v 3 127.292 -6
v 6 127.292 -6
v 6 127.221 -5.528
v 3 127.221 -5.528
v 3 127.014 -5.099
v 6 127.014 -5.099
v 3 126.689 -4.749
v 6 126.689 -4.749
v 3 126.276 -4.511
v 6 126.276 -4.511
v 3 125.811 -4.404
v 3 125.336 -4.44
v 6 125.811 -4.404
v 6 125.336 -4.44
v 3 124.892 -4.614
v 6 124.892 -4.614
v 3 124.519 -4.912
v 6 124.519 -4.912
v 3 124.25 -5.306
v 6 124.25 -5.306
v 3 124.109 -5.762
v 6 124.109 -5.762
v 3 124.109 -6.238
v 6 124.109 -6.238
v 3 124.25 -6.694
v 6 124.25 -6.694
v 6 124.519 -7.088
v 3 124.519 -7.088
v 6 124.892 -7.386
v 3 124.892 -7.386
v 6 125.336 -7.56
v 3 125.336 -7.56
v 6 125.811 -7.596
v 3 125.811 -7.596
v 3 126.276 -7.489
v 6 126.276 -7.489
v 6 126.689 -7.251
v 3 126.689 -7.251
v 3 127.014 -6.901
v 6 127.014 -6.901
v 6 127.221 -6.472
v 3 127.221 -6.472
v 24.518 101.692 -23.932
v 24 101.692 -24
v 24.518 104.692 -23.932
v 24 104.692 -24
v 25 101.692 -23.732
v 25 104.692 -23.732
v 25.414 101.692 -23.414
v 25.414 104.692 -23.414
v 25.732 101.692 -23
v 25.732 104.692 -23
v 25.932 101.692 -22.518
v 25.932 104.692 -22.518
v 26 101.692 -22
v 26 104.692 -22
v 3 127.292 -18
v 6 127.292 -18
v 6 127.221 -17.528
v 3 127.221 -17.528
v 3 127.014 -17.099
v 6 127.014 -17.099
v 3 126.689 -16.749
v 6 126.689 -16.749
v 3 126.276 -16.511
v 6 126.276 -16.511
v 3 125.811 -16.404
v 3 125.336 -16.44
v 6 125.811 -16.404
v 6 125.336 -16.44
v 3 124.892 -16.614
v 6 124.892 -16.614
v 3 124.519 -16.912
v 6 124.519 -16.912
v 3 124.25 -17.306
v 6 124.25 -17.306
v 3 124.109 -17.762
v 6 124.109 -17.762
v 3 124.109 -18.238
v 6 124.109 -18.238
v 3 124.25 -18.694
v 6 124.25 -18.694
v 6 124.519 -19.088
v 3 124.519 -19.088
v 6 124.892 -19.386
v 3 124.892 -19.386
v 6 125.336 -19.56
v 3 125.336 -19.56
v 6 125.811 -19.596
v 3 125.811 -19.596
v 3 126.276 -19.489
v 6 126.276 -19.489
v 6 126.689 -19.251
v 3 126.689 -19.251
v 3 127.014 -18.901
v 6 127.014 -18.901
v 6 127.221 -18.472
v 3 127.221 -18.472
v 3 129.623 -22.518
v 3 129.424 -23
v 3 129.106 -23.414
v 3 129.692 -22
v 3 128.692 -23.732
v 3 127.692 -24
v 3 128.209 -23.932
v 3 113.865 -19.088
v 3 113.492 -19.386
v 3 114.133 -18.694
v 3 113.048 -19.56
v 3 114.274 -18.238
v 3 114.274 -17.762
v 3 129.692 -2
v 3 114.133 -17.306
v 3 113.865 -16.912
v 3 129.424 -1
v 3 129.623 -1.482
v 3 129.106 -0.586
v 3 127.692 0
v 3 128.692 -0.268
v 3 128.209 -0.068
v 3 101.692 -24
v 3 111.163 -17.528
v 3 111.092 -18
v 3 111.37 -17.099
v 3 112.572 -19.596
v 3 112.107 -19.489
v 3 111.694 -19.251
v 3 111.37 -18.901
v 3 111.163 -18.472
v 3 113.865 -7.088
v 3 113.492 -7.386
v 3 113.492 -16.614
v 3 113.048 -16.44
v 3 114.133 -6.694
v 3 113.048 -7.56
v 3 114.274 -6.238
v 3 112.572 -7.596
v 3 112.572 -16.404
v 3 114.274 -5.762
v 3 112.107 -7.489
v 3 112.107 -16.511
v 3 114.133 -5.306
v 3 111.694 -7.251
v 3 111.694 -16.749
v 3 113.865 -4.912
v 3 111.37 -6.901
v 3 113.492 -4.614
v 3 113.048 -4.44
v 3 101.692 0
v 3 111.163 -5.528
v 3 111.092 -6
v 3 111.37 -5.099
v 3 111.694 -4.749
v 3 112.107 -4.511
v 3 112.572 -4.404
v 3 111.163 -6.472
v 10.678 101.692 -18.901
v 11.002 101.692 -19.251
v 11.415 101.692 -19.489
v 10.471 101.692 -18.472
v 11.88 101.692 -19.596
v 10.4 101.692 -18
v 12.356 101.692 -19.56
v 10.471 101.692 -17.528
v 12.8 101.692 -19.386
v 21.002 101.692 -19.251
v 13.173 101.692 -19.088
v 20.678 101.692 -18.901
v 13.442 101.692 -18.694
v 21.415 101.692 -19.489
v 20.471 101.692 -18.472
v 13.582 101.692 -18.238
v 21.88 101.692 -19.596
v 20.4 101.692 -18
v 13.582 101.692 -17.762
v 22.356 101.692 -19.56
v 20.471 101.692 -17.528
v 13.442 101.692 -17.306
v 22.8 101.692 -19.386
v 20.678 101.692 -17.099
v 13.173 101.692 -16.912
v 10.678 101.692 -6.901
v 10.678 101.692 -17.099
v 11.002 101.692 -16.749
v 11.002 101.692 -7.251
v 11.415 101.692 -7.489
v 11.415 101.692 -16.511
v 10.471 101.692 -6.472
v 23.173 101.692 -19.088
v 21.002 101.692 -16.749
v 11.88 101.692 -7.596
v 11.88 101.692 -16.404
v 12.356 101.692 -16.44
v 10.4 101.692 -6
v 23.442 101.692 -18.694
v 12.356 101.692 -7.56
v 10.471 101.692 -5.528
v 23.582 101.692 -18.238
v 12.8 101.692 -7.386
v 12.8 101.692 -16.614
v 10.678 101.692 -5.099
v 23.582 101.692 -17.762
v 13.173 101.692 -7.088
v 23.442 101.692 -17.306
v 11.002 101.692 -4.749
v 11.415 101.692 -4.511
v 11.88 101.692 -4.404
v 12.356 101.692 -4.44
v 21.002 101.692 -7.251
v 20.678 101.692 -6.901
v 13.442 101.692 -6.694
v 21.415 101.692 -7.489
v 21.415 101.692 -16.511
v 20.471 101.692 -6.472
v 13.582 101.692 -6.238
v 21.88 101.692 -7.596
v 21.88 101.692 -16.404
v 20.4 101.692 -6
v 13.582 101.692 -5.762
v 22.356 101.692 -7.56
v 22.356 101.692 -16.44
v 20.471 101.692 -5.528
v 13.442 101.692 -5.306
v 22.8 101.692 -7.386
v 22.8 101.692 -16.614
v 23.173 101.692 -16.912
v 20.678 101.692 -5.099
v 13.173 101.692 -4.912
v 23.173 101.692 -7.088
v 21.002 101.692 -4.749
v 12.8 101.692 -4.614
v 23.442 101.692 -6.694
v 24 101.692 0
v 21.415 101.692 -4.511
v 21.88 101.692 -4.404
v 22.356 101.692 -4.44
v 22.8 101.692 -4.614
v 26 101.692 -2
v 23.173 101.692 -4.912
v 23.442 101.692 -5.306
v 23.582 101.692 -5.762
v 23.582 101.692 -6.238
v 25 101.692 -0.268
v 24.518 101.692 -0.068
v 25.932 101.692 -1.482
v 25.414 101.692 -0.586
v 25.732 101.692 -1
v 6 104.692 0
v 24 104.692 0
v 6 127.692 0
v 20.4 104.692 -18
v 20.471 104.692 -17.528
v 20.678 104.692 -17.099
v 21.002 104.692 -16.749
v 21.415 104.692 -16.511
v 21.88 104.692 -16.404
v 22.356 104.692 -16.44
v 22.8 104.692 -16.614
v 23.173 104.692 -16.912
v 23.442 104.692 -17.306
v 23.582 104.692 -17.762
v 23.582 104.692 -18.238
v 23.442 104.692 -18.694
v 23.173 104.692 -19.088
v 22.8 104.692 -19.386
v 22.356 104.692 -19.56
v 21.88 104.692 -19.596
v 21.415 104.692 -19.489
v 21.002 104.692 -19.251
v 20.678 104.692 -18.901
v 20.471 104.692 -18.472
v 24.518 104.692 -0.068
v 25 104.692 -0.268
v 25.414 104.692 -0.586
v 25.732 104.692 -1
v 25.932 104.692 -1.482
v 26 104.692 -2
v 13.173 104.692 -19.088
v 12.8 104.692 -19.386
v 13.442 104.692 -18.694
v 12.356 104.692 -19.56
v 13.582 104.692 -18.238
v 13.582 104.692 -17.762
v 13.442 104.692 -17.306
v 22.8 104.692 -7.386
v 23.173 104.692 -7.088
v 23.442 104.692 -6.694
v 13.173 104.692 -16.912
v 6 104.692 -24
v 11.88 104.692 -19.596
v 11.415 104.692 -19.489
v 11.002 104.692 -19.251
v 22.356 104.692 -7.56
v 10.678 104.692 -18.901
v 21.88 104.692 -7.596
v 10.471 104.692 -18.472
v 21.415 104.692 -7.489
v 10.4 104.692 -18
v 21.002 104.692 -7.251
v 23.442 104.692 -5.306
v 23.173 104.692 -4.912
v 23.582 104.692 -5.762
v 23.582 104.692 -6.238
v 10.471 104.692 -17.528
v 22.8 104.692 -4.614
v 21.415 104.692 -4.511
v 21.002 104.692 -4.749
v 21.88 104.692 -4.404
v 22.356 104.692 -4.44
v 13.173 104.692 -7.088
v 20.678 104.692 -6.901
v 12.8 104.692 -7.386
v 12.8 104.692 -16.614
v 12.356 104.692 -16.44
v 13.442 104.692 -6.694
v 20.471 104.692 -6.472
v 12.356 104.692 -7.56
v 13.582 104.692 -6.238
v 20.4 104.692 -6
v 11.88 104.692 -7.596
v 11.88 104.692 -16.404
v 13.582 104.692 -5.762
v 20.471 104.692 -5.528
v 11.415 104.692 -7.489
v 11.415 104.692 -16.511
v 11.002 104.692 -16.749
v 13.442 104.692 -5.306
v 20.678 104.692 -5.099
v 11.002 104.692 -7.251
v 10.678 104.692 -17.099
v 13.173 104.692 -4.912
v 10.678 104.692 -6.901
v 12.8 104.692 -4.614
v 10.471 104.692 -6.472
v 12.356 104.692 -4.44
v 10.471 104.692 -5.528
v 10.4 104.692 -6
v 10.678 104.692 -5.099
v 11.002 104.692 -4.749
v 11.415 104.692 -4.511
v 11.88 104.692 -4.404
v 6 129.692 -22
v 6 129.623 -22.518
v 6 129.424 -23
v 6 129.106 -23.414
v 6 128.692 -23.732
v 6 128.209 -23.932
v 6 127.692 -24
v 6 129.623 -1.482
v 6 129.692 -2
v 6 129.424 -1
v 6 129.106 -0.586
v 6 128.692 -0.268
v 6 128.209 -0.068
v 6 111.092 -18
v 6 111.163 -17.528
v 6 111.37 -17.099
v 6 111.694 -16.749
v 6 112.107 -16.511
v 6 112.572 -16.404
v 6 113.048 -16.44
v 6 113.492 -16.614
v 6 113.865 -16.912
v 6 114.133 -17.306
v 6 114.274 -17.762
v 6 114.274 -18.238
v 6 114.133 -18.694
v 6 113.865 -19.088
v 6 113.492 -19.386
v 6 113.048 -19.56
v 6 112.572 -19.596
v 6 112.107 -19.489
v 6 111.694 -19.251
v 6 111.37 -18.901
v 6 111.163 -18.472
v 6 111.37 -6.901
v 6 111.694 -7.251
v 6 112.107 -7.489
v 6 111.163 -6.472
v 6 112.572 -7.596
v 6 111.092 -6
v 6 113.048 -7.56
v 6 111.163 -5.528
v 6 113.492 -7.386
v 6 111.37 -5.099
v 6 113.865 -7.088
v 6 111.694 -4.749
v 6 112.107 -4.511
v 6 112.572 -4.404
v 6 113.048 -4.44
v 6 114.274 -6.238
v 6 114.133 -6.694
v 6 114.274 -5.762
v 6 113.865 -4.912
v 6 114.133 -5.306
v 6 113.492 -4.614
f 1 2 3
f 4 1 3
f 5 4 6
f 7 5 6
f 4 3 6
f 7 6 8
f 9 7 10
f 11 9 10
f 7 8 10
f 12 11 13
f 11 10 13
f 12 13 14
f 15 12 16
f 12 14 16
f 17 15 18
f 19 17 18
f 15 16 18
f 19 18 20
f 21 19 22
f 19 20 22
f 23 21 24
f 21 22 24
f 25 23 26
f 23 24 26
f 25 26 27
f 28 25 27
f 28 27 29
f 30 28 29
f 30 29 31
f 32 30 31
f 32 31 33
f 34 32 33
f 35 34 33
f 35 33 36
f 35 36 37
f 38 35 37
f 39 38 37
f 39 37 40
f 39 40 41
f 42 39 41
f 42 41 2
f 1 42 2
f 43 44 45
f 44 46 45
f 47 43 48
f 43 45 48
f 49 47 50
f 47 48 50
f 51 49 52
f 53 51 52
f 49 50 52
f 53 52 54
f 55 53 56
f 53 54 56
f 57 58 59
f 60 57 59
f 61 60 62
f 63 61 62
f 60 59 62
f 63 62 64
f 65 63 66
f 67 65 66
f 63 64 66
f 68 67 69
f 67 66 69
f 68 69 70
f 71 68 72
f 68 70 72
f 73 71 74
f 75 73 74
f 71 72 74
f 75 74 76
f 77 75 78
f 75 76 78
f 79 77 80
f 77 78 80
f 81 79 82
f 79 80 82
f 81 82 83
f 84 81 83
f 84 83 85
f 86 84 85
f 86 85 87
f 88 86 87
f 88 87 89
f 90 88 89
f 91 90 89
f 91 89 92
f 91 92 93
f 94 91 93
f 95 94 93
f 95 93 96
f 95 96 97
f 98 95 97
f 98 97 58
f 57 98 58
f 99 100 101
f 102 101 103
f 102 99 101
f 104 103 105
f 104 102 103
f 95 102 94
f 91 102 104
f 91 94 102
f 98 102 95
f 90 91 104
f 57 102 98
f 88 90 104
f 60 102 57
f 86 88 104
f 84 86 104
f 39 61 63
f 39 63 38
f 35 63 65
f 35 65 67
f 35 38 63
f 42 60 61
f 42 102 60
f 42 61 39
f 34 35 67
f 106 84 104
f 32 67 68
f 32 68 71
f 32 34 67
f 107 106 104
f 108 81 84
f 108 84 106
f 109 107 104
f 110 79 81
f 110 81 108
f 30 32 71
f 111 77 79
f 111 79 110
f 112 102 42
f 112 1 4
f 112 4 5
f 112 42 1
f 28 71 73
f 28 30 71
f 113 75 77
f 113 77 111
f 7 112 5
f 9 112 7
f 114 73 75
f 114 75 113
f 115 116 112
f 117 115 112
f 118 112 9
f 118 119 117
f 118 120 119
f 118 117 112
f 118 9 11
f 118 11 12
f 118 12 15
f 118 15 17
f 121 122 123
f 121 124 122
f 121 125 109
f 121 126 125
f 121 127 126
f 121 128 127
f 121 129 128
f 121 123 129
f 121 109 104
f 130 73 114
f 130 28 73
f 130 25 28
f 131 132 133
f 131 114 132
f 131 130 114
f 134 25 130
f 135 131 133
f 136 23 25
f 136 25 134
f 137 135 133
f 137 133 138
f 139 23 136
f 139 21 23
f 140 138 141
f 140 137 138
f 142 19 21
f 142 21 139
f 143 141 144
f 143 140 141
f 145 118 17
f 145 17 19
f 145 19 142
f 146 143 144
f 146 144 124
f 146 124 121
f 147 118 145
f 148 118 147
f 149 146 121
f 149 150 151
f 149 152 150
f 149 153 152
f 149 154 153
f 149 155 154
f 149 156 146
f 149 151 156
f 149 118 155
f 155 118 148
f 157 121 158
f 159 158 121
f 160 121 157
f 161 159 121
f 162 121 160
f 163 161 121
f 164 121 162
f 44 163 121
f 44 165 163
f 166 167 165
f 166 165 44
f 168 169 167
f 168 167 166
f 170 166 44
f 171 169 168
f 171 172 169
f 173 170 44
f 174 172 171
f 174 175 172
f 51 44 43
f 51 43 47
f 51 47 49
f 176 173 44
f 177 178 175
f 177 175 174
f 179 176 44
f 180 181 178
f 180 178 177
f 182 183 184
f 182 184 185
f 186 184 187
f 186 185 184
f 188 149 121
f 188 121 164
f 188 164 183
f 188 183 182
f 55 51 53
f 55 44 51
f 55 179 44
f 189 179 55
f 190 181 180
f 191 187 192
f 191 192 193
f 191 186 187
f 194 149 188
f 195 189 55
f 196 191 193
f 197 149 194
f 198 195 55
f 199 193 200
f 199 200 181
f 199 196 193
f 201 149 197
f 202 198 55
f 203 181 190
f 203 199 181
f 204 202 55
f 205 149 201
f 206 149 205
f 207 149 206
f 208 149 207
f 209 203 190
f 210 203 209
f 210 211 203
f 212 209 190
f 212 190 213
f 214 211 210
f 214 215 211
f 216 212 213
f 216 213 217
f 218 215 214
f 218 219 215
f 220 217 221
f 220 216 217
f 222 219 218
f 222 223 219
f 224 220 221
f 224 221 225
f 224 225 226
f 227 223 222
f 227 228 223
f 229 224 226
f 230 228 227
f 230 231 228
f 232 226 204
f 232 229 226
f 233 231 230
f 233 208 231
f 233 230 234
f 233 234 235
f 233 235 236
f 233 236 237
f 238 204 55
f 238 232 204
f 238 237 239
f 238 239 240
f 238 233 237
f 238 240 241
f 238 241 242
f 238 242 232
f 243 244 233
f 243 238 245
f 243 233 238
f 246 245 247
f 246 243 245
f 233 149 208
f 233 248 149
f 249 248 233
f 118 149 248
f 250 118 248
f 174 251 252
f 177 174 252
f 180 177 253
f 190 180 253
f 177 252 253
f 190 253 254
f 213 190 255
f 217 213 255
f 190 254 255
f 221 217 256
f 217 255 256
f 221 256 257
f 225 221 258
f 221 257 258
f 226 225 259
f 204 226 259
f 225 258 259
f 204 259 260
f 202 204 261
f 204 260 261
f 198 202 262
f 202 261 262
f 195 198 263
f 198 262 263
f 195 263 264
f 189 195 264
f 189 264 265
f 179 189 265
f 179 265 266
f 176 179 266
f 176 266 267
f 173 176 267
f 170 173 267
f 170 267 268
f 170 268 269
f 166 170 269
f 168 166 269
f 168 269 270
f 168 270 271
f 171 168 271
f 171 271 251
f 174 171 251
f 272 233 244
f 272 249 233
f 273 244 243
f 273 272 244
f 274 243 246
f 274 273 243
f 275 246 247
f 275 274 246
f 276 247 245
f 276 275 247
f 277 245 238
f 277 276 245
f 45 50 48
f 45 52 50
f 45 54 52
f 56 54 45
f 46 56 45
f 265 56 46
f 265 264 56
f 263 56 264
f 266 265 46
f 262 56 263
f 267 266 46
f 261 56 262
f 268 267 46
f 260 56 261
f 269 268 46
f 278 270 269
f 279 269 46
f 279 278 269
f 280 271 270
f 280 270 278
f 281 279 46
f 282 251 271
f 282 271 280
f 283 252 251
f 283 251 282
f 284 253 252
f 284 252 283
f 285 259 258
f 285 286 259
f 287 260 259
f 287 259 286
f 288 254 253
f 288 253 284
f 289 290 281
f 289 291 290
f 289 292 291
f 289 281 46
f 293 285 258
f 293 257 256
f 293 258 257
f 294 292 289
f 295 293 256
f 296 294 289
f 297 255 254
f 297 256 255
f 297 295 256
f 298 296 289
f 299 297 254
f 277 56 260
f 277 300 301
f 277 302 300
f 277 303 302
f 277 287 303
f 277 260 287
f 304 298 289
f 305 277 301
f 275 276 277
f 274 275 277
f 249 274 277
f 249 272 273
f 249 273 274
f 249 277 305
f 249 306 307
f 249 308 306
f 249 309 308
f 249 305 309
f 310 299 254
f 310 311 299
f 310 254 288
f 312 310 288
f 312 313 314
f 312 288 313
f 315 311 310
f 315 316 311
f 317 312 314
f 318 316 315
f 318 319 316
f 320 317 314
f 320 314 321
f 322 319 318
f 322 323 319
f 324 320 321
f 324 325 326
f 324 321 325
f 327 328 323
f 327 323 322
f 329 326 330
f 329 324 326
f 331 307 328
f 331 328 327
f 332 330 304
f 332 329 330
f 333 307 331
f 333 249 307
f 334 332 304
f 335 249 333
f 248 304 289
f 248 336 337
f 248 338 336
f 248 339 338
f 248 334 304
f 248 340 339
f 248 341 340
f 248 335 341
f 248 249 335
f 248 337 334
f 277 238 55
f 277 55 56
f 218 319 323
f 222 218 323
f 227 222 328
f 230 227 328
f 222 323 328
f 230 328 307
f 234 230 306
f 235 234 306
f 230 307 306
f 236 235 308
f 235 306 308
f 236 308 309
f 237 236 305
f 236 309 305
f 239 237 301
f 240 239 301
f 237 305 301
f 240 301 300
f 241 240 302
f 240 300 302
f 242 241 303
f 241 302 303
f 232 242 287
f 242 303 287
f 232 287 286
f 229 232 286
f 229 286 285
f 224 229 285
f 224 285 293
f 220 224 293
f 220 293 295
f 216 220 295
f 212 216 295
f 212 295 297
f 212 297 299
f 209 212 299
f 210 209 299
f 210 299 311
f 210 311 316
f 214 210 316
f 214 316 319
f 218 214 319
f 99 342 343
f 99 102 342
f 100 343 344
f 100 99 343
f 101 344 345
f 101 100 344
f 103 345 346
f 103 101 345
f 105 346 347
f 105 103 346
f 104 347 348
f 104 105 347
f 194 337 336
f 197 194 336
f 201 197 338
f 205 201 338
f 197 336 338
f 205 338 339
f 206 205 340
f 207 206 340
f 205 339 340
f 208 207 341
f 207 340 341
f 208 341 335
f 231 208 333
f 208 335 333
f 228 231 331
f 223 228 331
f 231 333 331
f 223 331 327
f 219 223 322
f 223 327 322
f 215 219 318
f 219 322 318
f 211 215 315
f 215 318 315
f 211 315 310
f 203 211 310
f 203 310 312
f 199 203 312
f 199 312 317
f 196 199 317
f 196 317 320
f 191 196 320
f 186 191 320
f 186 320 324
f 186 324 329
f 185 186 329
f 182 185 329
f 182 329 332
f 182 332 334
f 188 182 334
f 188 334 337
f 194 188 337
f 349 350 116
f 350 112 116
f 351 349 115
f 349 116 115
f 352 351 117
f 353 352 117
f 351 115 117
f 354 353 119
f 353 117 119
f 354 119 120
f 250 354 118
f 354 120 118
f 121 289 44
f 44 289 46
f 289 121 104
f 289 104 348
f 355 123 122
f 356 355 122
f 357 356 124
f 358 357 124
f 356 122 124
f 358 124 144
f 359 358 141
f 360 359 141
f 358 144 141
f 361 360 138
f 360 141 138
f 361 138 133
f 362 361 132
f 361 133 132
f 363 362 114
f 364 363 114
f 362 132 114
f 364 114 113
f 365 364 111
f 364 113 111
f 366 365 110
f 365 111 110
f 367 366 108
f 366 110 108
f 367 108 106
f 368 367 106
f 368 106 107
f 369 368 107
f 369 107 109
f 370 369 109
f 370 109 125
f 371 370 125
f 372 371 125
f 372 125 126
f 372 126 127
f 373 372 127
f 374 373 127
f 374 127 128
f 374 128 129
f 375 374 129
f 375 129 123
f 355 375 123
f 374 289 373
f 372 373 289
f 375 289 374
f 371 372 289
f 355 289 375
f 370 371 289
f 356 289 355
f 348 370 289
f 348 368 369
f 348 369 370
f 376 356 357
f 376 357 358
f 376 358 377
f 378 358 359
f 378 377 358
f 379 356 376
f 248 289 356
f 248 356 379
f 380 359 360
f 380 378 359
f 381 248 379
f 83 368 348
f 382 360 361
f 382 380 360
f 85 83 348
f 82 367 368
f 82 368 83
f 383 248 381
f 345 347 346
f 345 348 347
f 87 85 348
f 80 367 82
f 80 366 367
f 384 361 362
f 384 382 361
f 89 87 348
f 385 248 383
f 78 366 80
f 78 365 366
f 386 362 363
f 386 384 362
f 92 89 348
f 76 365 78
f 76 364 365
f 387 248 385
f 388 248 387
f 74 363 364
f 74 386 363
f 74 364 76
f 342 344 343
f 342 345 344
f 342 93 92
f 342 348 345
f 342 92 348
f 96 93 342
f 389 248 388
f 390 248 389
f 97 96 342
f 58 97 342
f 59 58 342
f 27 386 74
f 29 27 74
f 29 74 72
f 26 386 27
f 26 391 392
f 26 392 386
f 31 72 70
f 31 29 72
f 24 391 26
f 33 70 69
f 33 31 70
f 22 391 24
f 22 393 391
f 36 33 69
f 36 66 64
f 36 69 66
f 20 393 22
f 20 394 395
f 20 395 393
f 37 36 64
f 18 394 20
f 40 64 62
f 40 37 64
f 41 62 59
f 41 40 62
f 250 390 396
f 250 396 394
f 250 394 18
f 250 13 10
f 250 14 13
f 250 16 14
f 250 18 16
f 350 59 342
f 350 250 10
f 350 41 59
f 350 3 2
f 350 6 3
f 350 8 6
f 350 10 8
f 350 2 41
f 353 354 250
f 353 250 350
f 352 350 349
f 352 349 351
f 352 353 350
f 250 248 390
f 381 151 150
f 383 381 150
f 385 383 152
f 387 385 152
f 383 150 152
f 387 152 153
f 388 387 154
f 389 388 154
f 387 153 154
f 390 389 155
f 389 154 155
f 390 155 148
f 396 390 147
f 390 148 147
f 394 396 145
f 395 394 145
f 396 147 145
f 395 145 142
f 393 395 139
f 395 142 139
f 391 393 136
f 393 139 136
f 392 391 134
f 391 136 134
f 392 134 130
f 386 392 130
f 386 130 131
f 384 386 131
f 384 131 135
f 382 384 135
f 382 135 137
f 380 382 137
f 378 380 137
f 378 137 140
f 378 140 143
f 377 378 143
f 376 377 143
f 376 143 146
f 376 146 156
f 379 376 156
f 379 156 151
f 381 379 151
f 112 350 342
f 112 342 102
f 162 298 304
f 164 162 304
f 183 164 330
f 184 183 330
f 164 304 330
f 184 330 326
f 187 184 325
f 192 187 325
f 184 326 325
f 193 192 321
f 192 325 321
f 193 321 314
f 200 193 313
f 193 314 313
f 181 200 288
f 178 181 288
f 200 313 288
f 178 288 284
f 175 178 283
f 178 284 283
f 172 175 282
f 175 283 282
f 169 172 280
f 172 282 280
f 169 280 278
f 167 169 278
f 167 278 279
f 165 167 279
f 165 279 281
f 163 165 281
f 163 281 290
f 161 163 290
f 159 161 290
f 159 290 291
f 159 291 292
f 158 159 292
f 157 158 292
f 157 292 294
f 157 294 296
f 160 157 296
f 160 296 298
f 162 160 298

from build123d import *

# Parameters (mm, degrees)
EXTRUDE_1_DEPTH     = 24
SKETCH_2_R          = 1.6
CUT_EXTRUDE_1_DEPTH = 24
SKETCH_3_R          = 1.6
CUT_EXTRUDE_2_DEPTH = 24
FILLET_1_R          = 2
SKETCH_4_R          = 1.6
CUT_EXTRUDE_3_DEPTH = 4
SKETCH_5_R          = 1.6
CUT_EXTRUDE_4_DEPTH = 4


with BuildPart() as part:
    # 草图1 → 凸台-拉伸1 (new body)
    with BuildSketch(Plane.XY):
        Polygon((6, 129.691622655), (3, 129.691622655), (3, 101.691622655), (26, 101.691622655), (26, 104.691622655), (6, 104.691622655), align=None)
    extrude(amount=-EXTRUDE_1_DEPTH)

    # 草图2 → 切除-拉伸1 (cut)
    with BuildSketch(Plane(origin=(6, 0, 0), x_dir=(0, 0, -1), z_dir=(1, 0, 0))):
        with Locations(Location((6, 125.691622655, 0), (0, 0, 90))):
            Circle(SKETCH_2_R)
        with Locations(Location((18, 125.691622655, 0), (0, 0, 90))):
            Circle(SKETCH_2_R)
    extrude(amount=-CUT_EXTRUDE_1_DEPTH, mode=Mode.SUBTRACT)

    # 草图3 → 切除-拉伸2 (cut)
    with BuildSketch(Plane(origin=(0, 104.691622655, 0), x_dir=(1, 0, 0), z_dir=(0, 1, 0))):
        with Locations(Location((22, 6, 0), (0, 0, 180))):
            Circle(SKETCH_3_R)
        with Locations(Location((22, 18, 0), (0, 0, 180))):
            Circle(SKETCH_3_R)
    extrude(amount=-CUT_EXTRUDE_2_DEPTH, mode=Mode.SUBTRACT)

    # 圆角1
    fillet_1_edges = [part.edges().sort_by_distance(p)[0] for p in [
        (4.5, 129.691622655, -24),
        (4.5, 129.691622655, 0),
        (26, 103.191622655, -24),
        (26, 103.191622655, 0),
    ]]
    fillet(fillet_1_edges, radius=FILLET_1_R)

    # 草图4 → 切除-拉伸3 (cut)
    with BuildSketch(Plane.ZY.offset(-3)):
        with Locations(Location((-18, 112.691622655, 0), (0, 0, 270))):
            Circle(SKETCH_4_R)
        with Locations(Location((-6, 112.691622655, 0), (0, 0, 270))):
            Circle(SKETCH_4_R)
    extrude(amount=-CUT_EXTRUDE_3_DEPTH, mode=Mode.SUBTRACT)

    # 草图5 → 切除-拉伸4 (cut)
    with BuildSketch(Plane(origin=(0, 104.691622655, 0), x_dir=(1, 0, 0), z_dir=(0, 1, 0))):
        with Locations(Location((12, 18, 0), (0, 0, 180))):
            Circle(SKETCH_5_R)
        with Locations(Location((12, 6, 0), (0, 0, 180))):
            Circle(SKETCH_5_R)
    extrude(amount=-CUT_EXTRUDE_4_DEPTH, mode=Mode.SUBTRACT)


solid = part.part
